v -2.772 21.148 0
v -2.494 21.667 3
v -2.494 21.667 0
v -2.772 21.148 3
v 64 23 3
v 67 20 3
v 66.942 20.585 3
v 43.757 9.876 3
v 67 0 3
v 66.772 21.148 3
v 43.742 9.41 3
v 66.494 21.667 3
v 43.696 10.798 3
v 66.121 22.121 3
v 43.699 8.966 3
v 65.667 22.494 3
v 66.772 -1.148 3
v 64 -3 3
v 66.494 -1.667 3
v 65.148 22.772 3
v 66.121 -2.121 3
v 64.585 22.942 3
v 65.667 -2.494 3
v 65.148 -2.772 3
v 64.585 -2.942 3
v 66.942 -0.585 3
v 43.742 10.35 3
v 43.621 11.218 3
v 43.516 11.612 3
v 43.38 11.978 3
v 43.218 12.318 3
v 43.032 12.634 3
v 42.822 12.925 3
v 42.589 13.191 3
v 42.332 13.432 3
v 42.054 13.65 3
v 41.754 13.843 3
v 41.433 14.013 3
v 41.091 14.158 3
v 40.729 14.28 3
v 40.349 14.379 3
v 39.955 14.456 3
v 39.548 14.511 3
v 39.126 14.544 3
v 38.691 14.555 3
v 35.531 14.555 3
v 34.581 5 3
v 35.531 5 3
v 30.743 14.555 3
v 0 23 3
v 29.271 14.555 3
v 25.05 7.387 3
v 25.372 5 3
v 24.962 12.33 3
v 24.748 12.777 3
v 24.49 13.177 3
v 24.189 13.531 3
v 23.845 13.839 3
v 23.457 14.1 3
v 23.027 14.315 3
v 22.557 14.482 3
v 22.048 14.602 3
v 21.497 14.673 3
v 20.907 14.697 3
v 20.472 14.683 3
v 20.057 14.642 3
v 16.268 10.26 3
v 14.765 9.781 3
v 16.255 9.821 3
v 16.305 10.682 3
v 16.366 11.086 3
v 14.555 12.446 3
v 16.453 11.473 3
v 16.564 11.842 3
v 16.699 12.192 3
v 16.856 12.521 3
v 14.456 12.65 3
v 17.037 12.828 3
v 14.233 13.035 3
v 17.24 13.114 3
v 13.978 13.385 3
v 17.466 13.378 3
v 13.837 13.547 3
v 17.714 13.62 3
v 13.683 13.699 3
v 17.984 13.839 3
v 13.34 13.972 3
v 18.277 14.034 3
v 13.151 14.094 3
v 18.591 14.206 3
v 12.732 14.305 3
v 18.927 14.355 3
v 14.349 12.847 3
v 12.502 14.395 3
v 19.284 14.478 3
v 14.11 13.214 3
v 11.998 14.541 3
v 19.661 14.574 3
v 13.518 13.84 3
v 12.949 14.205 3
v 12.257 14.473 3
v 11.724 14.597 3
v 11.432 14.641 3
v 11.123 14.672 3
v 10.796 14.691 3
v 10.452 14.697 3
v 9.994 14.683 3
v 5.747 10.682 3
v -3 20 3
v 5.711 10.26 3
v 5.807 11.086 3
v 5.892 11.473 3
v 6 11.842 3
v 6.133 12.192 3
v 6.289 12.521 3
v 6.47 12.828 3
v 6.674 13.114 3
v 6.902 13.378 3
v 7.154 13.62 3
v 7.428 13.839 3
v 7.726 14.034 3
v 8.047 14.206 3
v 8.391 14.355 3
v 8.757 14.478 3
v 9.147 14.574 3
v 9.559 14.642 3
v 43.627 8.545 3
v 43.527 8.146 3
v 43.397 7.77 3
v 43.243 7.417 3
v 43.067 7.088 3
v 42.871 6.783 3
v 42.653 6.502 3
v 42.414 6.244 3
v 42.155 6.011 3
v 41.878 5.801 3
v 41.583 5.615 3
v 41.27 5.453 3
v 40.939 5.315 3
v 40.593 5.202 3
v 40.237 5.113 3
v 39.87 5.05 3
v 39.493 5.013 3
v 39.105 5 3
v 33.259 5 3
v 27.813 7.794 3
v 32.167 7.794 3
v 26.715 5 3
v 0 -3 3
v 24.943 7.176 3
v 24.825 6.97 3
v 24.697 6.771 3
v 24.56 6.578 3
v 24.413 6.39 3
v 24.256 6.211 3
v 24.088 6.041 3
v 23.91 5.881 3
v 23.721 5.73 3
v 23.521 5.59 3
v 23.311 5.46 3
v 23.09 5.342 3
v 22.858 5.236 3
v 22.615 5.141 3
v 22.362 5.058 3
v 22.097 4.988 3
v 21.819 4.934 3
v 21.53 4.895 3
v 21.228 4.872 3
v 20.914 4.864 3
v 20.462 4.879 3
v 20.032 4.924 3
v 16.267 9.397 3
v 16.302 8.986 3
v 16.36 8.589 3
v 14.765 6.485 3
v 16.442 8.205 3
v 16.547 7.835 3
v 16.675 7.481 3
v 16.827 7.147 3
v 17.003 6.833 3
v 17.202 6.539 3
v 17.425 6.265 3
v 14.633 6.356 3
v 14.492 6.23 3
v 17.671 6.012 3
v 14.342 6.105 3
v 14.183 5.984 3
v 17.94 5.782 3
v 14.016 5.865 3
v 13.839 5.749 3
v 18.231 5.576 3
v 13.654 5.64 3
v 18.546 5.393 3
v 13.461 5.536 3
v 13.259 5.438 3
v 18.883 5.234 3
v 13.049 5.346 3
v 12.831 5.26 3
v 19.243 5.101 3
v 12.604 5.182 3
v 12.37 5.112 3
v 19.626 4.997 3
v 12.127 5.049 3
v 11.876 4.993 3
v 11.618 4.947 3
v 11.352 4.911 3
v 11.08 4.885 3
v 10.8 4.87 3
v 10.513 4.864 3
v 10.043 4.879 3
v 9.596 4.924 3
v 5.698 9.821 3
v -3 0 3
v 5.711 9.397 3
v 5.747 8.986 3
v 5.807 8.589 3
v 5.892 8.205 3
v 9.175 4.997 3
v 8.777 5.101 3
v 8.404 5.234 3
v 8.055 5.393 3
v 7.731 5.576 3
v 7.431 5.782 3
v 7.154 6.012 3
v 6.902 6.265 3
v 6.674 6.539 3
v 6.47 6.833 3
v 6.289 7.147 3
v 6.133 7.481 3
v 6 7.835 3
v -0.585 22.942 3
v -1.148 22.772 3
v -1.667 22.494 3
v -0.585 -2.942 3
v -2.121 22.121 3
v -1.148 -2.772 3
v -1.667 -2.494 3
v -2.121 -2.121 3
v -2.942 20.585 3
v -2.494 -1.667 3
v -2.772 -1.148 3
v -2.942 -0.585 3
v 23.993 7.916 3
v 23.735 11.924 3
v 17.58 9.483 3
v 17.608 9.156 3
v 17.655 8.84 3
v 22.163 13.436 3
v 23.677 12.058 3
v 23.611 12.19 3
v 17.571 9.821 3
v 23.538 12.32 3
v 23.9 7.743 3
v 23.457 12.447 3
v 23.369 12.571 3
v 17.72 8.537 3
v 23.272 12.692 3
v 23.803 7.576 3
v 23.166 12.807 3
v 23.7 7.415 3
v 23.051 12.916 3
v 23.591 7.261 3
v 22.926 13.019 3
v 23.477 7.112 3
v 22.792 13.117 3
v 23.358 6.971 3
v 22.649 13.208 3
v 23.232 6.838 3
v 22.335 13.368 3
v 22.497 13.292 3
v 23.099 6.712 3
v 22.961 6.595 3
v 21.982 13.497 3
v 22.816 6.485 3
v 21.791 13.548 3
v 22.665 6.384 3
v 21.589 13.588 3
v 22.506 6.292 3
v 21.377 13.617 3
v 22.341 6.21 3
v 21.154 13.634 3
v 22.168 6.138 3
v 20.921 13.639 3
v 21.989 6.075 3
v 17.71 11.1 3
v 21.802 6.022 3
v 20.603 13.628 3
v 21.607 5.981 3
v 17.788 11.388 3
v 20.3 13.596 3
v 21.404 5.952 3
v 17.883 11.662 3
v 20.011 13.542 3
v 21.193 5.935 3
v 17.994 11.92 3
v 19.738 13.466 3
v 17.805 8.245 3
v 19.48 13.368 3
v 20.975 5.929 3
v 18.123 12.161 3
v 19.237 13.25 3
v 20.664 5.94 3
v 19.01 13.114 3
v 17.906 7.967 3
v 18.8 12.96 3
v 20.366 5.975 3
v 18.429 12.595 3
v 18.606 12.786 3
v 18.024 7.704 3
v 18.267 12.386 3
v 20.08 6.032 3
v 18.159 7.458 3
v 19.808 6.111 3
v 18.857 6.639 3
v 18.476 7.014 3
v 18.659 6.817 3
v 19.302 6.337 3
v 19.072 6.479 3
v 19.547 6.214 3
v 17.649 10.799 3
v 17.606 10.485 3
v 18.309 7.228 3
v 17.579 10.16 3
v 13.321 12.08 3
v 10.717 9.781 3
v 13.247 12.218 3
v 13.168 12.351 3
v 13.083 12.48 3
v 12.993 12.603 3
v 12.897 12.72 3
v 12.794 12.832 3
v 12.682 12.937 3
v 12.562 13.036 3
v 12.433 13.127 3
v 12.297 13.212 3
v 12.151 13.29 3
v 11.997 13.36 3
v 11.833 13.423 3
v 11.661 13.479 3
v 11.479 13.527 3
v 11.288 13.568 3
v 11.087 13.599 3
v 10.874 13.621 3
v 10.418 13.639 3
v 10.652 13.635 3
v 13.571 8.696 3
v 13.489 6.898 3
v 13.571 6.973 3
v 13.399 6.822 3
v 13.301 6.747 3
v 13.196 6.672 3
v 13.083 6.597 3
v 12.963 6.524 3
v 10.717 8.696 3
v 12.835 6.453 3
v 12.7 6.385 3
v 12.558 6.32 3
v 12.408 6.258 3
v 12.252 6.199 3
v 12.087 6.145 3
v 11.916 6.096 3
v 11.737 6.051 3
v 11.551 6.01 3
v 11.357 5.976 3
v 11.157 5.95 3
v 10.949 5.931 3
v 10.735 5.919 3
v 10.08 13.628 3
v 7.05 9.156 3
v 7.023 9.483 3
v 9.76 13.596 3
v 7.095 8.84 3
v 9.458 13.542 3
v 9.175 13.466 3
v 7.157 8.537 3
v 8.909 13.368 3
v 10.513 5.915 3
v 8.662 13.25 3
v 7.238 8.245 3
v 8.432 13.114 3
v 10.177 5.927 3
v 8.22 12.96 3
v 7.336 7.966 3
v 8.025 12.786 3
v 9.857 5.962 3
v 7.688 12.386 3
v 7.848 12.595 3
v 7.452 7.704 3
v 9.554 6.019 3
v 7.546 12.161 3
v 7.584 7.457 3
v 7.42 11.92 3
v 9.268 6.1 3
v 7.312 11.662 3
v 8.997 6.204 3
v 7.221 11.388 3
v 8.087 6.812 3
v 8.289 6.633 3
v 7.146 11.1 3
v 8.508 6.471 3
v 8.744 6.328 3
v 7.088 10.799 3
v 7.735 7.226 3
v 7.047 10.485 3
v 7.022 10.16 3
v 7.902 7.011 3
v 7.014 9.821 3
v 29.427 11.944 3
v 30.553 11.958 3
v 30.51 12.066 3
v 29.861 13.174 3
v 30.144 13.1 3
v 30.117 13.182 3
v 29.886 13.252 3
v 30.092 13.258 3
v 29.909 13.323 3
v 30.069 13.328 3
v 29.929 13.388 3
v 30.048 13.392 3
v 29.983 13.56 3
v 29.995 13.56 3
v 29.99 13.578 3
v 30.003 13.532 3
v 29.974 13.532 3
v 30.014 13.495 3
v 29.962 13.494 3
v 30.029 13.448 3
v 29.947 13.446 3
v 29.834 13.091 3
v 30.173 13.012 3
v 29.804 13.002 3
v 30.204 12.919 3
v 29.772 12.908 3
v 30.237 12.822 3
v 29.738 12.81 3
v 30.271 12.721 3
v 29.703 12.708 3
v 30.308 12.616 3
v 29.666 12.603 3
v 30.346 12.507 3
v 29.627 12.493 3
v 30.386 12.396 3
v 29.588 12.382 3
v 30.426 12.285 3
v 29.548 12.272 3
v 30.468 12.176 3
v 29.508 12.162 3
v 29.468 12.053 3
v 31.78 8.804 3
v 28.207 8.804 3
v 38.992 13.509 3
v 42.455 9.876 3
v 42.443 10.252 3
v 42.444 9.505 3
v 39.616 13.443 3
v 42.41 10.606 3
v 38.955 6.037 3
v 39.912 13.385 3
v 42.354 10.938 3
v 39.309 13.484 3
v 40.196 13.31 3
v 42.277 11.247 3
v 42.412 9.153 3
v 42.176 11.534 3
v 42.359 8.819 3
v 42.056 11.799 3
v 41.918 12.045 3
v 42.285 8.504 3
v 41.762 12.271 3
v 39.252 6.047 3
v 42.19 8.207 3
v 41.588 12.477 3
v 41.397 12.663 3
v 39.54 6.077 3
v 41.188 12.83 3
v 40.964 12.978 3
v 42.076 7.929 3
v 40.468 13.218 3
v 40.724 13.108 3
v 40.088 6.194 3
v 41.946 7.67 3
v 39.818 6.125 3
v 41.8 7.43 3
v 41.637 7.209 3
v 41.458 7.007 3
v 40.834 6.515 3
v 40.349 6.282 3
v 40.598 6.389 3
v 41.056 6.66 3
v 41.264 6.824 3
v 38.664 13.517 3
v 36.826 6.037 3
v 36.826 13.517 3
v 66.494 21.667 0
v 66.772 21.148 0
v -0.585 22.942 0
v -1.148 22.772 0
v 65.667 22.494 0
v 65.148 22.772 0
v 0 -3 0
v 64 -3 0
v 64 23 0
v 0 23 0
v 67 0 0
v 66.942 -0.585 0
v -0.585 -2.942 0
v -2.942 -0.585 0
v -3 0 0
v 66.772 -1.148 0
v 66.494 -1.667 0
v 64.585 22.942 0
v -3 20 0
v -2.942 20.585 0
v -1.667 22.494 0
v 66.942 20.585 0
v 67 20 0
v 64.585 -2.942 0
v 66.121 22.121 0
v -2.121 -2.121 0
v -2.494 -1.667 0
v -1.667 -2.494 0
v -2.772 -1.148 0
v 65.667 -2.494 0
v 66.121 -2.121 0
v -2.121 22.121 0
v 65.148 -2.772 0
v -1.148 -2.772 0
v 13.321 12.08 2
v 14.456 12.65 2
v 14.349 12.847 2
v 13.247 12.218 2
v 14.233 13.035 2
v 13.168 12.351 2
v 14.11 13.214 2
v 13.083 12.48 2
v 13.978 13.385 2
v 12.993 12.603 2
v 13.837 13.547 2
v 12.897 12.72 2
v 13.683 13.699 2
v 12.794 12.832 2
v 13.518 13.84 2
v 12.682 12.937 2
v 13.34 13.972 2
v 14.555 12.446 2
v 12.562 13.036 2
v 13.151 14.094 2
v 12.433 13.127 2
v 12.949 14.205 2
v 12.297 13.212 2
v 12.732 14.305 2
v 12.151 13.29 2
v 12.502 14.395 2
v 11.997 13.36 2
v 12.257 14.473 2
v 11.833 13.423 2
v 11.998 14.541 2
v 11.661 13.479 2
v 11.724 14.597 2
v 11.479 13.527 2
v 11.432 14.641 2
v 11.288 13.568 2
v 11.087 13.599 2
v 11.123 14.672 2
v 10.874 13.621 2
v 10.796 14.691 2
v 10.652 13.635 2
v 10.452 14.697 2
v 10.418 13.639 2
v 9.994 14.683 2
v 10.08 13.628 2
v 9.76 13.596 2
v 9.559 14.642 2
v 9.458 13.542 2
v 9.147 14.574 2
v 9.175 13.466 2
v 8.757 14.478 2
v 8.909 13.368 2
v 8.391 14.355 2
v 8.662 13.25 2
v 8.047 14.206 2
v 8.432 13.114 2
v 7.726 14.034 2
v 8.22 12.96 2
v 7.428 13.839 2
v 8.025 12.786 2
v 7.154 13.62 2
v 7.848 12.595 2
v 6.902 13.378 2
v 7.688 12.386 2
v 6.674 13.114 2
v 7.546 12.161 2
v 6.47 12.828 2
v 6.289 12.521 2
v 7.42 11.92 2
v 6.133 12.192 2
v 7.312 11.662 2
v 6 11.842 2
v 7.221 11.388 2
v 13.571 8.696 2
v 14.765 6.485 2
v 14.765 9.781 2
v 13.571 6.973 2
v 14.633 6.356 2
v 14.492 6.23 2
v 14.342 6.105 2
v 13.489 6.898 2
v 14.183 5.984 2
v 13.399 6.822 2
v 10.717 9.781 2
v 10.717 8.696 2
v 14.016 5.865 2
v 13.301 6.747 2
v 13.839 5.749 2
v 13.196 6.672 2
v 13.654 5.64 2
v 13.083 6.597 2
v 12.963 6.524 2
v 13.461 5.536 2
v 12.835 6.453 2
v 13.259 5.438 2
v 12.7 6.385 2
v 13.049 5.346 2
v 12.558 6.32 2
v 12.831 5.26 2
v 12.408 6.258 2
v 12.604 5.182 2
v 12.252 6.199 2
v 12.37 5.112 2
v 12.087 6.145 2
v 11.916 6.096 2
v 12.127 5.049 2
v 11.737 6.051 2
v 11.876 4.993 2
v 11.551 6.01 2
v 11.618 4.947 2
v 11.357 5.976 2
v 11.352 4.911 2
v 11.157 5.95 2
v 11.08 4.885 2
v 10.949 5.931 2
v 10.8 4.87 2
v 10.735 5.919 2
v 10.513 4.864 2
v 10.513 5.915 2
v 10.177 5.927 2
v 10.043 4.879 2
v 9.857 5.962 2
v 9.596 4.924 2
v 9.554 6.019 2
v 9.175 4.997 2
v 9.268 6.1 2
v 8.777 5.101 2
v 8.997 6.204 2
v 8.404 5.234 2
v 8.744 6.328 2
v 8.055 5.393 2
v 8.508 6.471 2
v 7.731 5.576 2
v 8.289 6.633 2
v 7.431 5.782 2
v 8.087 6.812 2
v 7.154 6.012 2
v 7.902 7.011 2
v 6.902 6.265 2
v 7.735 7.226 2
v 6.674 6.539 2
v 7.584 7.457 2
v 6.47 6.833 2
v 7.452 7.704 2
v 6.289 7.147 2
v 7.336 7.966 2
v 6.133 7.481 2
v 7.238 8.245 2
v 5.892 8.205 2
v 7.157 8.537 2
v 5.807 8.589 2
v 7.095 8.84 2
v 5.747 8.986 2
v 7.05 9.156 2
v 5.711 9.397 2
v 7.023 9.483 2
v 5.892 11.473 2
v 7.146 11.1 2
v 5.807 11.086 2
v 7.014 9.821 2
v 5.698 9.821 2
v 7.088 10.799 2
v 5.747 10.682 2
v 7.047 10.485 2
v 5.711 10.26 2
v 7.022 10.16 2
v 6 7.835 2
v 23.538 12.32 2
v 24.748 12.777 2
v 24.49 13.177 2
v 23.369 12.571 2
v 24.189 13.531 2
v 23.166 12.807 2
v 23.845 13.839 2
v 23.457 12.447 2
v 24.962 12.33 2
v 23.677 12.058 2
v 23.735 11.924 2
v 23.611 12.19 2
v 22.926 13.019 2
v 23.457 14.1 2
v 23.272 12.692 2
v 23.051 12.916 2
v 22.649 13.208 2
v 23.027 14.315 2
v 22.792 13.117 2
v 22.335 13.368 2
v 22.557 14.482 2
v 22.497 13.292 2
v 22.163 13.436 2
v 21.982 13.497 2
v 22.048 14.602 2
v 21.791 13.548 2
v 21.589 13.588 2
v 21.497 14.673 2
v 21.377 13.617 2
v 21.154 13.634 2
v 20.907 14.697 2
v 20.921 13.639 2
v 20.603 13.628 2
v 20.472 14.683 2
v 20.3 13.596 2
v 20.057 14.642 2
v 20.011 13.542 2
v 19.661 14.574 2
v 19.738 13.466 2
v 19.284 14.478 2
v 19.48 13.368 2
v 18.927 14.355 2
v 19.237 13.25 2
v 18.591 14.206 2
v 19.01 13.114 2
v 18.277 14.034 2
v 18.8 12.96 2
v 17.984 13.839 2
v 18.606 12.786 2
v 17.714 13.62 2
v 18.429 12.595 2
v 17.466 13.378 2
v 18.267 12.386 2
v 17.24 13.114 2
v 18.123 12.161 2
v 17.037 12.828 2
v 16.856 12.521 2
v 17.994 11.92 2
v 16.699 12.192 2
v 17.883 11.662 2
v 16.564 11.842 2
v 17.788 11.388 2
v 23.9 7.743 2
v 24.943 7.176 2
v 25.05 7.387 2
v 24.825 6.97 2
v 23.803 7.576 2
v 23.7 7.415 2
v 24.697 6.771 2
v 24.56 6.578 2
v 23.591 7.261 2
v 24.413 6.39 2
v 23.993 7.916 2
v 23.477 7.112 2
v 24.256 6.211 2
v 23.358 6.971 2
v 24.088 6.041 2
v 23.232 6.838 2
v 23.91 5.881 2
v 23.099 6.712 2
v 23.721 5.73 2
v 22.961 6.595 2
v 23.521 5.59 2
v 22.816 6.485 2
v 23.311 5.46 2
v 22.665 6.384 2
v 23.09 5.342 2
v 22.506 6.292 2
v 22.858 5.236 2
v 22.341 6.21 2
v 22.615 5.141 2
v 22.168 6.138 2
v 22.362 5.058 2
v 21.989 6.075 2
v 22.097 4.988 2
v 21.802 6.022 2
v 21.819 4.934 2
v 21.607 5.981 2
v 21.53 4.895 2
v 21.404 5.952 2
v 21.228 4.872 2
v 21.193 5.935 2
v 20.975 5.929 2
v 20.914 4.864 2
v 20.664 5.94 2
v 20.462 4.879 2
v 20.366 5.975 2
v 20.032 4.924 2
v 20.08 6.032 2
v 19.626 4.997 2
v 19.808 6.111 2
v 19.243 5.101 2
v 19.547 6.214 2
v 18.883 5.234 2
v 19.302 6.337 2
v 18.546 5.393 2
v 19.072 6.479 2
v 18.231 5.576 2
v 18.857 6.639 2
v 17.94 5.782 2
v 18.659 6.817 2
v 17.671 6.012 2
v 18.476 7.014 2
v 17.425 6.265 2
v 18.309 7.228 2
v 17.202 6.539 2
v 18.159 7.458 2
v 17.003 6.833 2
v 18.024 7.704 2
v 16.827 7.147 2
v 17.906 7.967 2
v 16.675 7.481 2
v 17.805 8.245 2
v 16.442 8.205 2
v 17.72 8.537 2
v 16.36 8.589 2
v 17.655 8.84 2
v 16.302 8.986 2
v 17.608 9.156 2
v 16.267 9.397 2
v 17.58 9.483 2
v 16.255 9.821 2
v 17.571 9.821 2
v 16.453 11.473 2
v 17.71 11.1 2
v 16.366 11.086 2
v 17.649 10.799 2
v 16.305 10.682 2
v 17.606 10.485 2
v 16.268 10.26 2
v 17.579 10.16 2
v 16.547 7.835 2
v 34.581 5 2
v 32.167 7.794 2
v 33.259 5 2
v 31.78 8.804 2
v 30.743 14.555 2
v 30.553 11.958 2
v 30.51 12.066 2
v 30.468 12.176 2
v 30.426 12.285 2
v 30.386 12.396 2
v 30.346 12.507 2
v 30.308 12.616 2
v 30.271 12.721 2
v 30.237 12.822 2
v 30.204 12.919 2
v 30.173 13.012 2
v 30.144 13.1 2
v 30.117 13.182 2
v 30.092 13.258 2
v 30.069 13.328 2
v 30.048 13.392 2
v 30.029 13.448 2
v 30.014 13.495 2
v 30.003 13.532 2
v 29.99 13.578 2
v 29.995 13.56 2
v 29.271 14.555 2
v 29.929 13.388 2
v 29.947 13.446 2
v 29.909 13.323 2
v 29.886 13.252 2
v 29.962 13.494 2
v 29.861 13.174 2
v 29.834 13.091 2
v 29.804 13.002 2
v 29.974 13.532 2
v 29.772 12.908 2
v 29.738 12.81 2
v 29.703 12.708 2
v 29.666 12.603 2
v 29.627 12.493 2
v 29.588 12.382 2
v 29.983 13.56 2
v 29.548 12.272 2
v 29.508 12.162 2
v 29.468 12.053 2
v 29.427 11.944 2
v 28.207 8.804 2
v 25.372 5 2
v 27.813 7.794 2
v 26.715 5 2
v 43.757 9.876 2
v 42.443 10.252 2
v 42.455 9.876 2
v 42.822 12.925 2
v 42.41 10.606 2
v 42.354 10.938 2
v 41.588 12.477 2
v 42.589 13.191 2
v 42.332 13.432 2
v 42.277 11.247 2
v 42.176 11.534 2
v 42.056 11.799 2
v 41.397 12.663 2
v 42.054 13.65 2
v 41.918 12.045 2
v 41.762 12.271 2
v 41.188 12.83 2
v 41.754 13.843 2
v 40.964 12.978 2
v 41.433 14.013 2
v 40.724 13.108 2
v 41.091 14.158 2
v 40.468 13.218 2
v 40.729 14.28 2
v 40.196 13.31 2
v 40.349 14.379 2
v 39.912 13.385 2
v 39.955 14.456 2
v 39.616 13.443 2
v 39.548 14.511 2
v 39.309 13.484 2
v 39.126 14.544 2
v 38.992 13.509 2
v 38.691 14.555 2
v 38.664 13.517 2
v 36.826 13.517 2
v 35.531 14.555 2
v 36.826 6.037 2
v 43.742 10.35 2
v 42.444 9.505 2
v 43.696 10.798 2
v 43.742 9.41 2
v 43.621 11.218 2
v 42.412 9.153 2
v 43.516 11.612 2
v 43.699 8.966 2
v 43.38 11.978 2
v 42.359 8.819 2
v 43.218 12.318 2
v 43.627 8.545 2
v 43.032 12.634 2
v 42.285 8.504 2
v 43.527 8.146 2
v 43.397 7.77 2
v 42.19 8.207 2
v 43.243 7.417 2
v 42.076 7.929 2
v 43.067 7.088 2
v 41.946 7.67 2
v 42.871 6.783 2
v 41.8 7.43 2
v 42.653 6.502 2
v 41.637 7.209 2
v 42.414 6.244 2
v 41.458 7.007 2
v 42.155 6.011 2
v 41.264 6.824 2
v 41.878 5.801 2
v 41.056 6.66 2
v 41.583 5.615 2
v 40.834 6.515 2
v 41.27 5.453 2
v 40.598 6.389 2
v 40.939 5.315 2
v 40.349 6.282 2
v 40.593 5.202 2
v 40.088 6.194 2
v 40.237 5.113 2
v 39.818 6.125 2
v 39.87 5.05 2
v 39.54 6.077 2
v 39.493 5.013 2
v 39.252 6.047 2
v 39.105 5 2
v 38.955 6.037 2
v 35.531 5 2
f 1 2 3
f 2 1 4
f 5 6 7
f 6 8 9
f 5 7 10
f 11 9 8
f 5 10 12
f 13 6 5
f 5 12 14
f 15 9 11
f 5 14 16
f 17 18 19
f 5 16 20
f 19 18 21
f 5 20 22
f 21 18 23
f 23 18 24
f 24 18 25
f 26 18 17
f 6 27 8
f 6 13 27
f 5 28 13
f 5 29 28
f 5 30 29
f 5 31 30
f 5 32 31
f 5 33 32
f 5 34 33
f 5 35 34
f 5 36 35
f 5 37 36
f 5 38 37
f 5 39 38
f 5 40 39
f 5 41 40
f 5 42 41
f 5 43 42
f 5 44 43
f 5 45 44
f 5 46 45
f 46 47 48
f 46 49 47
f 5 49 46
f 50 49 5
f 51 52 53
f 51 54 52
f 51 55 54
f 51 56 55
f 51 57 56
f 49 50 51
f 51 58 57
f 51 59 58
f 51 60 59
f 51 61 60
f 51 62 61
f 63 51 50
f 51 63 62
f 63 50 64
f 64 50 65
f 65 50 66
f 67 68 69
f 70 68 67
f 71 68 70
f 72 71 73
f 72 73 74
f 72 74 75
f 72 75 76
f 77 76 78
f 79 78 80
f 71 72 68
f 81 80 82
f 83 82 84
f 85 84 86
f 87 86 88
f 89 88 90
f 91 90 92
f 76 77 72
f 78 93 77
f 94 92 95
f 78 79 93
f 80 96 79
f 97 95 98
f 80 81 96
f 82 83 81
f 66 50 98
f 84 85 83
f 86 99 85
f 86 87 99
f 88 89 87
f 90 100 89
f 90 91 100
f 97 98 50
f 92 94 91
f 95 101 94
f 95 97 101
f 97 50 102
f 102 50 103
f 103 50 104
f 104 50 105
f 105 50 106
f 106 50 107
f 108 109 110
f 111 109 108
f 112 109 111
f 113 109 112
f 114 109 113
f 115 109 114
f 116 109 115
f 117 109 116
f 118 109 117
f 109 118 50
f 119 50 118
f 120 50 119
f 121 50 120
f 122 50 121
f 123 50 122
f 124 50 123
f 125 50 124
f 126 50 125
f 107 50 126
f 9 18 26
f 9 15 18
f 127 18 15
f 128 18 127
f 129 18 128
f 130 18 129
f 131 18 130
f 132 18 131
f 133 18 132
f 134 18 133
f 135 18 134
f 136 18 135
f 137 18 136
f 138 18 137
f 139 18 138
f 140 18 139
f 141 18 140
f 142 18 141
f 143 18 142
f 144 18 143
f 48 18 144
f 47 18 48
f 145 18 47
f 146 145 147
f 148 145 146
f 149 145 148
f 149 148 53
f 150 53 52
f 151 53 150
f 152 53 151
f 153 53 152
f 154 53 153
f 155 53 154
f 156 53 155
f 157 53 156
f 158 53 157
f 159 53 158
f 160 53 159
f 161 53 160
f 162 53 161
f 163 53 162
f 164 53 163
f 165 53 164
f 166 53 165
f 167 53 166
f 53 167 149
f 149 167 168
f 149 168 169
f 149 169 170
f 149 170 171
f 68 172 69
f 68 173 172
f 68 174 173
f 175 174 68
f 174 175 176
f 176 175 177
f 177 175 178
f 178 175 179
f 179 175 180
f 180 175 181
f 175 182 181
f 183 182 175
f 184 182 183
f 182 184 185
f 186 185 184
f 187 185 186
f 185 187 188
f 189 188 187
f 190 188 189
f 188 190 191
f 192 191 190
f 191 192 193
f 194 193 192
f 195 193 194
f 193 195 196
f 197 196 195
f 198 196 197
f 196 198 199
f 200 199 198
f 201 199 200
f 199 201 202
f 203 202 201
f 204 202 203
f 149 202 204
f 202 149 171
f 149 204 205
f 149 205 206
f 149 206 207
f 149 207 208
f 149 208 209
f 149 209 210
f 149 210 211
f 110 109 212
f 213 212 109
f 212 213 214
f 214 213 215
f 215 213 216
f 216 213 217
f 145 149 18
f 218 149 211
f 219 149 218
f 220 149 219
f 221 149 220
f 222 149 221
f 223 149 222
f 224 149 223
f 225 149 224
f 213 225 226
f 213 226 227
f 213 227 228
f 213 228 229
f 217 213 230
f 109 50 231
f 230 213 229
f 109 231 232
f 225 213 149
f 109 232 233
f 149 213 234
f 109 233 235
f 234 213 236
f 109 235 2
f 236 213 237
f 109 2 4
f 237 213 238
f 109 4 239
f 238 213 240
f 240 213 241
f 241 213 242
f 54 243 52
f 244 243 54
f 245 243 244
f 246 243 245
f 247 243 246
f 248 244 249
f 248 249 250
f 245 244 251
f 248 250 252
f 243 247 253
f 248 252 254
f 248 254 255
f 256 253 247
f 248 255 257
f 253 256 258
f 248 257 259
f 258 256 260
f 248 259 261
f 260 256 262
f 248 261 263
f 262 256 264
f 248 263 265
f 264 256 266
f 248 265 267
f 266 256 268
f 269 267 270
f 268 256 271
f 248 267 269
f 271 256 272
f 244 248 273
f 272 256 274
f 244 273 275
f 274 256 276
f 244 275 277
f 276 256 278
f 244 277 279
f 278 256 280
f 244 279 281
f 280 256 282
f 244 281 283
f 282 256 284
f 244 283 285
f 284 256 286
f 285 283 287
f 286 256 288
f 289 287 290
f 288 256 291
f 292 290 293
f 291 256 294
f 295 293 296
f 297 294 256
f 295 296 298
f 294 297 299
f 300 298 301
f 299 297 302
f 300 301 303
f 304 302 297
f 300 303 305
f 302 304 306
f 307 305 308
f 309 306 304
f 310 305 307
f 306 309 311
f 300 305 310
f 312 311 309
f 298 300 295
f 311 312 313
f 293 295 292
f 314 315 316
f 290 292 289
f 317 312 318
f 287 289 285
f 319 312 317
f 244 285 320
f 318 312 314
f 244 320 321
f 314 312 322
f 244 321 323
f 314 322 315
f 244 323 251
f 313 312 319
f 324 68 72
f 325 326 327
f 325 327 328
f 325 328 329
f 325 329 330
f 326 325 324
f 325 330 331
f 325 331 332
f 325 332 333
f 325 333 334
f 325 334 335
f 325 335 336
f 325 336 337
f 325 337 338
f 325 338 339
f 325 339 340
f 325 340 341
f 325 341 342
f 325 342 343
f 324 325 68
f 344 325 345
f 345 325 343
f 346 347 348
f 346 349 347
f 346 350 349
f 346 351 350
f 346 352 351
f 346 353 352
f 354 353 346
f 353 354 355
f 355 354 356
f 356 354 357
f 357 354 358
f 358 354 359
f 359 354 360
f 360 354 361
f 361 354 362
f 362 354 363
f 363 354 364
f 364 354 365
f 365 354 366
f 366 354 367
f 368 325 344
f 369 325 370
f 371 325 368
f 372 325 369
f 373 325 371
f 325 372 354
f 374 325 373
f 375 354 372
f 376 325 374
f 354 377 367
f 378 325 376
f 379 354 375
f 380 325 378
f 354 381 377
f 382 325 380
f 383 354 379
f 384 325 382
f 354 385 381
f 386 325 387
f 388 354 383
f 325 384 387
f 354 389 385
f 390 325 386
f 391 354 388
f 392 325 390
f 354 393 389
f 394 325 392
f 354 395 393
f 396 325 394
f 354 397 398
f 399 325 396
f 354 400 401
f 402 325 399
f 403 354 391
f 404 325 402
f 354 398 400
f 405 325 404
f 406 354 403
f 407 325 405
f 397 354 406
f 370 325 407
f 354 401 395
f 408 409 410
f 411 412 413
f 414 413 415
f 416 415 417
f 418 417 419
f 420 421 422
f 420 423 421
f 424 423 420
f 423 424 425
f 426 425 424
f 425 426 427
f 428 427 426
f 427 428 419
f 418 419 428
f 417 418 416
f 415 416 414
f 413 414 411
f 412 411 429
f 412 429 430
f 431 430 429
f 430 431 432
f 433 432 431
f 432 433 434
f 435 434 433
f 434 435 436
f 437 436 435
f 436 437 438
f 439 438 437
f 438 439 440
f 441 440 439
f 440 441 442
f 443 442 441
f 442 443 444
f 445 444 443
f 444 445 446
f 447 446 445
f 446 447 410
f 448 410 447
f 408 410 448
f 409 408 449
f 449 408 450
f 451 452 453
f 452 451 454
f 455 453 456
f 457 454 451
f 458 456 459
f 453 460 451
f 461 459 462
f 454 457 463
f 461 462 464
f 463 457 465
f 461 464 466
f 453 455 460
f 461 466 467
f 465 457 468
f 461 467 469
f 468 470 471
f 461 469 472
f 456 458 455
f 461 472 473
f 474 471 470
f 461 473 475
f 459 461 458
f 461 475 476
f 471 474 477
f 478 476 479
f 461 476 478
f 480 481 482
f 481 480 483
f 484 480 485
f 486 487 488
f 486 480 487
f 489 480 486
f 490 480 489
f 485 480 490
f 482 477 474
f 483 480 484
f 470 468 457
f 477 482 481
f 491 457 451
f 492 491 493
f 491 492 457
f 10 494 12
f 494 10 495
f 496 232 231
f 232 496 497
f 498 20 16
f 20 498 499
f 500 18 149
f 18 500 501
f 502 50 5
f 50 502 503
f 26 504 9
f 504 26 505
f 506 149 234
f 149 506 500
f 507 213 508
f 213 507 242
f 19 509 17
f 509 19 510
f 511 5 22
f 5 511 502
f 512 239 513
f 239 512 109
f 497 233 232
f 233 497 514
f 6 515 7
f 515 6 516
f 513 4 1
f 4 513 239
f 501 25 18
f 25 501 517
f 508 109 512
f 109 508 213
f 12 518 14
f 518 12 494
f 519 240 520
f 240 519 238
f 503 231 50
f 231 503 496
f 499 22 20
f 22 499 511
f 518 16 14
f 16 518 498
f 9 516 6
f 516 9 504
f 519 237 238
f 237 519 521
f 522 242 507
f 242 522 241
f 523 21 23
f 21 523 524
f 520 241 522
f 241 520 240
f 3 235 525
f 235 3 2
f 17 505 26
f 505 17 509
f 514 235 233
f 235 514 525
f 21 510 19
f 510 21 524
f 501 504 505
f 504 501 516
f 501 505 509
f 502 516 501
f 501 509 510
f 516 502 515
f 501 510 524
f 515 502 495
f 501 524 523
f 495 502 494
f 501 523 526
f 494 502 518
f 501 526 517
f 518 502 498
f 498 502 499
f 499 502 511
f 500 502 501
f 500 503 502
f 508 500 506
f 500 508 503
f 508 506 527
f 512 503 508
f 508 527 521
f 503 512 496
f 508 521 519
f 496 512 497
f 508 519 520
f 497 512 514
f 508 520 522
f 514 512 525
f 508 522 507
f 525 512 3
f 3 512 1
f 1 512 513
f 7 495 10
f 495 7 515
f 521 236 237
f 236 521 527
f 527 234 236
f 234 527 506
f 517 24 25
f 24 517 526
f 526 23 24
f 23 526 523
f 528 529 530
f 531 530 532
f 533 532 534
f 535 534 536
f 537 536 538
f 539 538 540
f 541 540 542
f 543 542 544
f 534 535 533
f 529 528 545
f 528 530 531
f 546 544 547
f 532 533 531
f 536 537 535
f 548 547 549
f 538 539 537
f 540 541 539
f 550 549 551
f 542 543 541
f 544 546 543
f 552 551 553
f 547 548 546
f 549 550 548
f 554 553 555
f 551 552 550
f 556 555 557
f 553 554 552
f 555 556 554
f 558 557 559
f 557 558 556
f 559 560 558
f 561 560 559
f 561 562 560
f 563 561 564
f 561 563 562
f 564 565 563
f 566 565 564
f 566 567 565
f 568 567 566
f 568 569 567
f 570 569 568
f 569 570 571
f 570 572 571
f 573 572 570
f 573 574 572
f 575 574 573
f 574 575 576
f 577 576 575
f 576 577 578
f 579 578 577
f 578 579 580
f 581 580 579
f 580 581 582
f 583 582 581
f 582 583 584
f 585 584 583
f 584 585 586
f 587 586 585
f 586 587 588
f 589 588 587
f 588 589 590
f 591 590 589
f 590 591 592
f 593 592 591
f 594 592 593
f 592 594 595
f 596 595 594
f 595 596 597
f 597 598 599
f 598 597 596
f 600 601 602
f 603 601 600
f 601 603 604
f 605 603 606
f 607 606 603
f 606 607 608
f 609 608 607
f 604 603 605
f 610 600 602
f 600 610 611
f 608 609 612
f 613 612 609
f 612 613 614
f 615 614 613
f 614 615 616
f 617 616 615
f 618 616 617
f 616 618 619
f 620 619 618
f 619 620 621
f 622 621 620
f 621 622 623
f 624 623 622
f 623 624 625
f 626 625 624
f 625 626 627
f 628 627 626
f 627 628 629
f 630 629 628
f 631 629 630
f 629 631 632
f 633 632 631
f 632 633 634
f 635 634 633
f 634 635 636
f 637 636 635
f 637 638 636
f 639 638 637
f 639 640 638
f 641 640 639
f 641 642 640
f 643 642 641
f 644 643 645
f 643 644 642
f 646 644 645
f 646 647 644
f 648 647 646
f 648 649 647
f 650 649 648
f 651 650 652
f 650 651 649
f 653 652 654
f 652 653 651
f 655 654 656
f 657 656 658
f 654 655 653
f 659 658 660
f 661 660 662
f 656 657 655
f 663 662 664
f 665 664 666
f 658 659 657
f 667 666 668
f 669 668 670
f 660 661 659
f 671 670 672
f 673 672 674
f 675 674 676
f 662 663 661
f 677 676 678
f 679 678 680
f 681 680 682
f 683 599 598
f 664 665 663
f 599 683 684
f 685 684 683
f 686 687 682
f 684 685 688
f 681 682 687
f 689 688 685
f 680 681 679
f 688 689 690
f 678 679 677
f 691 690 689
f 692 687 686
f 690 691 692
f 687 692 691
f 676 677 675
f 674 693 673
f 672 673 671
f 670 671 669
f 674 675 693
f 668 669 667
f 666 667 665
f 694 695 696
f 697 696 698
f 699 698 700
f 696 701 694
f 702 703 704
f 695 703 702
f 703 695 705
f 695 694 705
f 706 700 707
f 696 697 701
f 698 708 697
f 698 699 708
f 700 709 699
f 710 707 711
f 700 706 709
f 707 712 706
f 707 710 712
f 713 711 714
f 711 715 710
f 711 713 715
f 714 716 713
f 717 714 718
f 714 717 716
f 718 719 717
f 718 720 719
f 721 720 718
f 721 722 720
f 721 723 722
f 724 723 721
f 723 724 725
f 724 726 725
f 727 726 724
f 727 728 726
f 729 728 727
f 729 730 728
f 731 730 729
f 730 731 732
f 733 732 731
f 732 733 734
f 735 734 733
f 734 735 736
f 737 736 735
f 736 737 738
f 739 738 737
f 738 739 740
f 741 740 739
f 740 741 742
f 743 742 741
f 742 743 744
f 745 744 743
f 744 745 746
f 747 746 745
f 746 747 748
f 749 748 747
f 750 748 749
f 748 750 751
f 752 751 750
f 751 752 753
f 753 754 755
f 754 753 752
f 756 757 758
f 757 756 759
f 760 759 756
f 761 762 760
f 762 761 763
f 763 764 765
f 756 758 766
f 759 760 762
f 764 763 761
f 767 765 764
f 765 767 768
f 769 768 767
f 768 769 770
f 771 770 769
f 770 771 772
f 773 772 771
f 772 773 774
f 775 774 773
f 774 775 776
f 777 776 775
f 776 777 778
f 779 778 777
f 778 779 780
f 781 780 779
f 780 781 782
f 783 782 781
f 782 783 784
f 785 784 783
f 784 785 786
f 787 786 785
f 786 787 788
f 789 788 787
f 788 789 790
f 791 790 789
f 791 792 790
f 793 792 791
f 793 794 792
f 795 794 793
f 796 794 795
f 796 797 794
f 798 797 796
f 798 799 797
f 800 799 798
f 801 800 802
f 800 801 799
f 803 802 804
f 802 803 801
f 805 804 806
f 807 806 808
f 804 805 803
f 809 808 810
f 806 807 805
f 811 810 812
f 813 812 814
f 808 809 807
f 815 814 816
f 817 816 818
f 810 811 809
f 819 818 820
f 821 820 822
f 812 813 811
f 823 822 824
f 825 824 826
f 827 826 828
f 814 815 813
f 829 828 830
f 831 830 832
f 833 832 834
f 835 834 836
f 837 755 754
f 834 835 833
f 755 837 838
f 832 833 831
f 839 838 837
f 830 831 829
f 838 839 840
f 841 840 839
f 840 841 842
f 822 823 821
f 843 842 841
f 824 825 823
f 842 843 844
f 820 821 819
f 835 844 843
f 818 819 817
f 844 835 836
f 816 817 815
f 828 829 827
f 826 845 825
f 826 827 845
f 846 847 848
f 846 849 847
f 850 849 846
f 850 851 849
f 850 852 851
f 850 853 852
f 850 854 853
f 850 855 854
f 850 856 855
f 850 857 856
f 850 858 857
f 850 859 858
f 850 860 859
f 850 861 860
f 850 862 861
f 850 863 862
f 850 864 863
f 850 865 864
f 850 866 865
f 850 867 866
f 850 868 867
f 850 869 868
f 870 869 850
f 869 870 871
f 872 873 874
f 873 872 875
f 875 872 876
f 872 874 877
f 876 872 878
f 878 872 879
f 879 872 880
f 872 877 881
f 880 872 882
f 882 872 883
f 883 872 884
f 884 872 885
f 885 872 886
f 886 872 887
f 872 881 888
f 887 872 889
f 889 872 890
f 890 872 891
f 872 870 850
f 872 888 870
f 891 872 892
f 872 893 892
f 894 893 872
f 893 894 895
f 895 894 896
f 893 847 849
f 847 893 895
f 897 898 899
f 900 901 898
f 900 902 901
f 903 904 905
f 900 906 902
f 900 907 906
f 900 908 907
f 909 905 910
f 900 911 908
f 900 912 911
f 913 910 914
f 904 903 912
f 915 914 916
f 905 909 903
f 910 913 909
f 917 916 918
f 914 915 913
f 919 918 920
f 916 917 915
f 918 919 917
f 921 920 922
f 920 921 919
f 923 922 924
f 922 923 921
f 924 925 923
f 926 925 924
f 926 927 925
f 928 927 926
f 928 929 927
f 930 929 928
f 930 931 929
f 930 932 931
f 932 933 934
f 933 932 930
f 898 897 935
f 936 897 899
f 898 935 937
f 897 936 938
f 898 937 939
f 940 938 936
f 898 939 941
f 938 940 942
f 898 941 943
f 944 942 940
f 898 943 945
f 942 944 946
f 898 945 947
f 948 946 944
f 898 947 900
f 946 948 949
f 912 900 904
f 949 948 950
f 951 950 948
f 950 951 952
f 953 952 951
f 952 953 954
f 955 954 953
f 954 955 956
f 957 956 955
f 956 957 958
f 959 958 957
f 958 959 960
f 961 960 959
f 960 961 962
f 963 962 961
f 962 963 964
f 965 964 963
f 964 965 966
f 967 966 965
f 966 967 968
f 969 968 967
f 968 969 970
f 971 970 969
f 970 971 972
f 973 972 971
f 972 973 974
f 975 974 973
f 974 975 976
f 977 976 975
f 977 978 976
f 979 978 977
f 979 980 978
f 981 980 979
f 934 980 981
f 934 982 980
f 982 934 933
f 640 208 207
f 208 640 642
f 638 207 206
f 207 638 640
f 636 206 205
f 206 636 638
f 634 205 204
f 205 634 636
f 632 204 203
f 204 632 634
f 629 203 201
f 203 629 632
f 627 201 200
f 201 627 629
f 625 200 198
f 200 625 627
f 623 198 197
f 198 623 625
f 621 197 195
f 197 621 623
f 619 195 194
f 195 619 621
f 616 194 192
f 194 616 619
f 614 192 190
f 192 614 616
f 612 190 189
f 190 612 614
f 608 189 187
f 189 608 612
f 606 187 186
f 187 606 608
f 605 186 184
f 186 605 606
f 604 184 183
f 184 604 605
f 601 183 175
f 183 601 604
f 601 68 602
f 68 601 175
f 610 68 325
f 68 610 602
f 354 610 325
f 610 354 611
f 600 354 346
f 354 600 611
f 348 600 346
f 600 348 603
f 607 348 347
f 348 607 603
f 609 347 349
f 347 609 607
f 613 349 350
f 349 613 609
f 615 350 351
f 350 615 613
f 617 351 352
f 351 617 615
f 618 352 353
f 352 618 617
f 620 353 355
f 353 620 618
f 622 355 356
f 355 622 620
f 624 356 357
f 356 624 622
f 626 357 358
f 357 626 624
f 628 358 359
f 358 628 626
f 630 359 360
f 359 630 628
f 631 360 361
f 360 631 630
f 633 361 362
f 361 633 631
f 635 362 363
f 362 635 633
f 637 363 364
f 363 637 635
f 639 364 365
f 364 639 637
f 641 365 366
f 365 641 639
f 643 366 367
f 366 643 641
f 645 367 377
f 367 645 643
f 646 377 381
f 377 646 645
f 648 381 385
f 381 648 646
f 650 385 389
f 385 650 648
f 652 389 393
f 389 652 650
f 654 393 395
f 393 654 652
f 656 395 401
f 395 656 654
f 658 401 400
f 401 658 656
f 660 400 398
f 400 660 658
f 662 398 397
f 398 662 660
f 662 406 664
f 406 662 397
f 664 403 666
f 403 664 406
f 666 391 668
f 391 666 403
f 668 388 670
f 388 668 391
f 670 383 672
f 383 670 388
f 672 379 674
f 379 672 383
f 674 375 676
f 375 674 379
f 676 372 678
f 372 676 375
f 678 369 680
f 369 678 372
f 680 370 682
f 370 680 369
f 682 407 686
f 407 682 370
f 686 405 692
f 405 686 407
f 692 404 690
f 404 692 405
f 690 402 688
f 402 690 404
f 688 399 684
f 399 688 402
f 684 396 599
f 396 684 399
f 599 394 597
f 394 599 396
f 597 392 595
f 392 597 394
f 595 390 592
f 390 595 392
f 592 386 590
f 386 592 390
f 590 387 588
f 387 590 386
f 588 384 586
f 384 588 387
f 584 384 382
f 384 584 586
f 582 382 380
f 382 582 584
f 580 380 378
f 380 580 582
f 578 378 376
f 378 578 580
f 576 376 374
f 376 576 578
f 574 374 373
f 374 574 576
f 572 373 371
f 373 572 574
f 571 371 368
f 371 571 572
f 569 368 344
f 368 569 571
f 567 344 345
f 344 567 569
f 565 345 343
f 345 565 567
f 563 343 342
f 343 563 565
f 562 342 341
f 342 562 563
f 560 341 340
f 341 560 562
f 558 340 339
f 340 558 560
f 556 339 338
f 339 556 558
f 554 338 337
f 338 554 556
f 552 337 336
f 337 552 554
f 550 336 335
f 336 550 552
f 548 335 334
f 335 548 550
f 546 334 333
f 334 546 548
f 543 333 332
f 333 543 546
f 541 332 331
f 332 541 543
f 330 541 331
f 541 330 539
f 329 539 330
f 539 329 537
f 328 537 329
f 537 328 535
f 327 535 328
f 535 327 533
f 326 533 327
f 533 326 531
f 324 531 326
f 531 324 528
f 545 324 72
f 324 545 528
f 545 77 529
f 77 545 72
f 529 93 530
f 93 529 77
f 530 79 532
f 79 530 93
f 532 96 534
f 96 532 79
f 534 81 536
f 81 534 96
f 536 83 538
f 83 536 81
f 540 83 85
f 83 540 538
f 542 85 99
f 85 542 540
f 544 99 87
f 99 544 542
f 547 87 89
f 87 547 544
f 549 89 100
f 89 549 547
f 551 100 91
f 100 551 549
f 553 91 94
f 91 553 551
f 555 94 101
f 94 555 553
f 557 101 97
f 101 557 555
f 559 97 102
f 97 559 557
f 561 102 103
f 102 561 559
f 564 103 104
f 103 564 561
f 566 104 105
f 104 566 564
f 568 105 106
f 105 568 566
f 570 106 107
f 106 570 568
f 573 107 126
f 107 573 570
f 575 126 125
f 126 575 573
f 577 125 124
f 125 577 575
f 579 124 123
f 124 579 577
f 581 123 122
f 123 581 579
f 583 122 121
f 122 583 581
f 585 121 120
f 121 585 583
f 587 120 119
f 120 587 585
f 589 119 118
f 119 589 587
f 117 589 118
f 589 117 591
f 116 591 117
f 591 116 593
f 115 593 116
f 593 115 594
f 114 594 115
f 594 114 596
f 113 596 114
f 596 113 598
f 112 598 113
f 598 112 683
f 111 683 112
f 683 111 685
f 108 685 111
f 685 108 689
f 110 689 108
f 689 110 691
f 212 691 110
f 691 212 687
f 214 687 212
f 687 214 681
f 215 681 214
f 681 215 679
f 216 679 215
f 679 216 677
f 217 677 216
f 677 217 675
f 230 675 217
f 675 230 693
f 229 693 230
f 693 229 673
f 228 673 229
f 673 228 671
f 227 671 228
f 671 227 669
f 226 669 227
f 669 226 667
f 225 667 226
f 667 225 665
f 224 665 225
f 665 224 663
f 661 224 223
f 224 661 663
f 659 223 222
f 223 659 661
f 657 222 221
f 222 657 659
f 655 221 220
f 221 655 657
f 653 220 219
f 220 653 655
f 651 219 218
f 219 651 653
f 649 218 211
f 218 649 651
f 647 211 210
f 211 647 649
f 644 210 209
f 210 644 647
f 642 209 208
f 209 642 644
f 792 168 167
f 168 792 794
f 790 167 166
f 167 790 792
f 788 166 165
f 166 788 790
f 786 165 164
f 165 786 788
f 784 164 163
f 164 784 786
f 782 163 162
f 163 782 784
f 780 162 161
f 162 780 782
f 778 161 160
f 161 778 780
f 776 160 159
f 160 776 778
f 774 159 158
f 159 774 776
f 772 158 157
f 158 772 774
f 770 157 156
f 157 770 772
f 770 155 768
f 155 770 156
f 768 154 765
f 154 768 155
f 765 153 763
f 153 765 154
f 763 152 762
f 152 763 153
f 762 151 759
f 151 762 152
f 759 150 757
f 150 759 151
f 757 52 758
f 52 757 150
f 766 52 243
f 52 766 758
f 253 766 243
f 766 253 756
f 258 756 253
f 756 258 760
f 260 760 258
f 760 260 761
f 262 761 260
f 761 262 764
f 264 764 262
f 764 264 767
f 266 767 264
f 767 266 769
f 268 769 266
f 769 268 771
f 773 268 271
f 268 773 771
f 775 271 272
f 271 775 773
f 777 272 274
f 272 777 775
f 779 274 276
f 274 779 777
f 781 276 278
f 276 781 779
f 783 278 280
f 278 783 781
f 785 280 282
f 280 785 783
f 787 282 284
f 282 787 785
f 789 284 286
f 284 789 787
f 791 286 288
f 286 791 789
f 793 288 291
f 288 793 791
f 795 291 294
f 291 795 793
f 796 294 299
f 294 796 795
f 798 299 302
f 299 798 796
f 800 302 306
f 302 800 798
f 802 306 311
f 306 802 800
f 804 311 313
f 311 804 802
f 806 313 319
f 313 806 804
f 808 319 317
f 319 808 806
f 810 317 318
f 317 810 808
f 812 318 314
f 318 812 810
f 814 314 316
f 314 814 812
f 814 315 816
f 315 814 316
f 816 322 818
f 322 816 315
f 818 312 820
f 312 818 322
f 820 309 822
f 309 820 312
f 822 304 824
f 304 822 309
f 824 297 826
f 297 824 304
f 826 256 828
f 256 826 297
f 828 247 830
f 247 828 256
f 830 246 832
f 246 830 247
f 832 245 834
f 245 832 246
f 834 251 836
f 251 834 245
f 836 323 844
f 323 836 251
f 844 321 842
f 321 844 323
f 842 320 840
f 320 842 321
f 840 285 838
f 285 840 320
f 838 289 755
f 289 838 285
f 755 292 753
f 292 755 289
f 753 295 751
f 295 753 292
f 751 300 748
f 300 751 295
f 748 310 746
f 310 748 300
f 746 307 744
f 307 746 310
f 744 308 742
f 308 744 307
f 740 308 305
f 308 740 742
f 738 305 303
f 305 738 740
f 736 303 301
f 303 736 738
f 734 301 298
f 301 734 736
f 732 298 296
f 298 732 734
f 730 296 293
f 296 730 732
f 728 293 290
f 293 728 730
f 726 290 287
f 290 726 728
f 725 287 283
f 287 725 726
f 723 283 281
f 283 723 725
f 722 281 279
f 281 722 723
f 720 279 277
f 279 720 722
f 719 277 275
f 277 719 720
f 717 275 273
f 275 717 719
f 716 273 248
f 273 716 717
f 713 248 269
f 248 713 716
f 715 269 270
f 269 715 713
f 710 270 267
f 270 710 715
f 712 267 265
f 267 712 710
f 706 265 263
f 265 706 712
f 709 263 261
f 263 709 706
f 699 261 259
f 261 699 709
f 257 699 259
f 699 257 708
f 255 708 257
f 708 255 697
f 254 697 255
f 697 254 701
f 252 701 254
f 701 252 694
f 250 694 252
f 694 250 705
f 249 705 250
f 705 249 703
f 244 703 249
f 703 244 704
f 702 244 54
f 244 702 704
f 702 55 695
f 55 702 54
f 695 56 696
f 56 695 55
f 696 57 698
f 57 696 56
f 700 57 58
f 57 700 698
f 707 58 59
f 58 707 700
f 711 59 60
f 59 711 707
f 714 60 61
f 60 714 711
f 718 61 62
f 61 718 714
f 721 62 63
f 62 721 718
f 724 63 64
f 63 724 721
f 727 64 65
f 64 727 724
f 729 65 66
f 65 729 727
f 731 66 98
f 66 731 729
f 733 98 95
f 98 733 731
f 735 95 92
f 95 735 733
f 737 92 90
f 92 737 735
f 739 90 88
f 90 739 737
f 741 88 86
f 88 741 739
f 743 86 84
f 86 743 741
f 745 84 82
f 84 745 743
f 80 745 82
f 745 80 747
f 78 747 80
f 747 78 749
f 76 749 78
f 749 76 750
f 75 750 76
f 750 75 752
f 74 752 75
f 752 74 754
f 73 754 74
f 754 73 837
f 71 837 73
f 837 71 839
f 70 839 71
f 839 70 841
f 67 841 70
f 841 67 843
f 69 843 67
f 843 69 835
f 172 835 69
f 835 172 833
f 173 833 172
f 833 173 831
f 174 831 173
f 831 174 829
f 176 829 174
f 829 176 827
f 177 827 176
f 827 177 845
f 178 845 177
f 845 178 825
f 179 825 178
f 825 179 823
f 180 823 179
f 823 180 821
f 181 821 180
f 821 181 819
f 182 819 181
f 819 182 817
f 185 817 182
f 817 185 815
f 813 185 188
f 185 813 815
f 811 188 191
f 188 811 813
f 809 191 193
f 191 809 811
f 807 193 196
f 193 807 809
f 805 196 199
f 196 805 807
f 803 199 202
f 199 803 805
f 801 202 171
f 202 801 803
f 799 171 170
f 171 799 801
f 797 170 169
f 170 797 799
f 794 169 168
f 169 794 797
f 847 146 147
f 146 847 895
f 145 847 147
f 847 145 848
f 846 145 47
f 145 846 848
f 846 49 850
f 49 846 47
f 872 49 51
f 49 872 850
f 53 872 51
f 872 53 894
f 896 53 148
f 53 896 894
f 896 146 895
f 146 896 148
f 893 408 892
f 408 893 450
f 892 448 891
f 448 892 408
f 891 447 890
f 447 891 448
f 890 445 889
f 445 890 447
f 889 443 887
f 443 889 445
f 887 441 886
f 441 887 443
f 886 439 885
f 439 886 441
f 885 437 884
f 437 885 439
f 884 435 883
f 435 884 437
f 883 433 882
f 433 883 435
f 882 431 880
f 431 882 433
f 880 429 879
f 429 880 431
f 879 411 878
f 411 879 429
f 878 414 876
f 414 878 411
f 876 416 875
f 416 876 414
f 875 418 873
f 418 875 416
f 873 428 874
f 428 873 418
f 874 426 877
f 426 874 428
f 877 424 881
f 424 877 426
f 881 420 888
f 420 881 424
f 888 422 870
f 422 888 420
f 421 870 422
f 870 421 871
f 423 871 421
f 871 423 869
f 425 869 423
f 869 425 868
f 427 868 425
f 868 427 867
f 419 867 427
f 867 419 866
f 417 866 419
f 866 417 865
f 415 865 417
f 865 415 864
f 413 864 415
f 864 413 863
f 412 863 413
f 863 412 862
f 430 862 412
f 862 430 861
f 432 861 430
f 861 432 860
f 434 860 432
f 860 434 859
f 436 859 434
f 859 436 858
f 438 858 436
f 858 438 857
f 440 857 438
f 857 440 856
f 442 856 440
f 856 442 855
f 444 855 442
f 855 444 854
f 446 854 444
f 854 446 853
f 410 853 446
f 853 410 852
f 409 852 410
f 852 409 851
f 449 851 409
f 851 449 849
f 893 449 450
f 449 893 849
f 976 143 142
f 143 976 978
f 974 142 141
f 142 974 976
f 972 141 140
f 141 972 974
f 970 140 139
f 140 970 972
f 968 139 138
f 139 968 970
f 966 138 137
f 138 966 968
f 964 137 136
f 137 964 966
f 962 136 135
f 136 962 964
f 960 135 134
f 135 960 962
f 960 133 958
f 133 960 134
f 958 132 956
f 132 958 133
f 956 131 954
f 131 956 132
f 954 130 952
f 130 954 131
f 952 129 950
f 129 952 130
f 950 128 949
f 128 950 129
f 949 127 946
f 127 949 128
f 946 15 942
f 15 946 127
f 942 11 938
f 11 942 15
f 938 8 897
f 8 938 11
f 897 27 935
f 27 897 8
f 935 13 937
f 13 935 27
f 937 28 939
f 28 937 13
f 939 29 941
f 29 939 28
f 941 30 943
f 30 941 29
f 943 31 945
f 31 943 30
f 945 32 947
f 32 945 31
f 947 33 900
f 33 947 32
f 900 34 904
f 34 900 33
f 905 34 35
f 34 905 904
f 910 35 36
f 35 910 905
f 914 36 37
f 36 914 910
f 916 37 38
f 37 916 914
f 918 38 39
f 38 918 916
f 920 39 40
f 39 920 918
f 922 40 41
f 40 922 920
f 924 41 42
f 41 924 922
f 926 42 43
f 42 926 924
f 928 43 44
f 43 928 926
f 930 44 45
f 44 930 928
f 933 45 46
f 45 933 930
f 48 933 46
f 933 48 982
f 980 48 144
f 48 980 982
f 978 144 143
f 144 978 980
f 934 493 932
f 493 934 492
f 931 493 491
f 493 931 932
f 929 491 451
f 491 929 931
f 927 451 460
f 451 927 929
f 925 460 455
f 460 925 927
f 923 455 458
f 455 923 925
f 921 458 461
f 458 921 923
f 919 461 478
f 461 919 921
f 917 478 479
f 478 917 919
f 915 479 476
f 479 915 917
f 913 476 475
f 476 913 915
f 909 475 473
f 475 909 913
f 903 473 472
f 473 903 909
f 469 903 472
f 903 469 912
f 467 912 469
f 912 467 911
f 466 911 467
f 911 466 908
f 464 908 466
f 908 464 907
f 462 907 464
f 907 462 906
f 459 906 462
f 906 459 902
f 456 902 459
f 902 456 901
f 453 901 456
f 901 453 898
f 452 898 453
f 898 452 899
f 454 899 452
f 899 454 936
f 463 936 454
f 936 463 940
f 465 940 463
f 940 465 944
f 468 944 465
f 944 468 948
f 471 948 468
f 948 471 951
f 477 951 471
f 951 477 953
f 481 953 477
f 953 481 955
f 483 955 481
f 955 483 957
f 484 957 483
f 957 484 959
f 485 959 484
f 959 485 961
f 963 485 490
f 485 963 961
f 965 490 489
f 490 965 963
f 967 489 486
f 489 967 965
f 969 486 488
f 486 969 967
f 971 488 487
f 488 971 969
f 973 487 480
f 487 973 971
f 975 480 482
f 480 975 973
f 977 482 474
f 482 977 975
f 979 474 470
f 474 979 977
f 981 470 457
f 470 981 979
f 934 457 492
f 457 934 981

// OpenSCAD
// A name plate, rendered by your installed OpenSCAD.
// text() and minkowski() are OpenSCAD's own; GCAD Studio receives the finished mesh.
$fn = 32;

width = 64;
depth = 20;

difference() {
    minkowski() {
        cube([width, depth, 2]);
        cylinder(r = 3, h = 1);
    }
    translate([5, 5, 2])
        linear_extrude(2)
            text("GCAD", size = 10);
}
